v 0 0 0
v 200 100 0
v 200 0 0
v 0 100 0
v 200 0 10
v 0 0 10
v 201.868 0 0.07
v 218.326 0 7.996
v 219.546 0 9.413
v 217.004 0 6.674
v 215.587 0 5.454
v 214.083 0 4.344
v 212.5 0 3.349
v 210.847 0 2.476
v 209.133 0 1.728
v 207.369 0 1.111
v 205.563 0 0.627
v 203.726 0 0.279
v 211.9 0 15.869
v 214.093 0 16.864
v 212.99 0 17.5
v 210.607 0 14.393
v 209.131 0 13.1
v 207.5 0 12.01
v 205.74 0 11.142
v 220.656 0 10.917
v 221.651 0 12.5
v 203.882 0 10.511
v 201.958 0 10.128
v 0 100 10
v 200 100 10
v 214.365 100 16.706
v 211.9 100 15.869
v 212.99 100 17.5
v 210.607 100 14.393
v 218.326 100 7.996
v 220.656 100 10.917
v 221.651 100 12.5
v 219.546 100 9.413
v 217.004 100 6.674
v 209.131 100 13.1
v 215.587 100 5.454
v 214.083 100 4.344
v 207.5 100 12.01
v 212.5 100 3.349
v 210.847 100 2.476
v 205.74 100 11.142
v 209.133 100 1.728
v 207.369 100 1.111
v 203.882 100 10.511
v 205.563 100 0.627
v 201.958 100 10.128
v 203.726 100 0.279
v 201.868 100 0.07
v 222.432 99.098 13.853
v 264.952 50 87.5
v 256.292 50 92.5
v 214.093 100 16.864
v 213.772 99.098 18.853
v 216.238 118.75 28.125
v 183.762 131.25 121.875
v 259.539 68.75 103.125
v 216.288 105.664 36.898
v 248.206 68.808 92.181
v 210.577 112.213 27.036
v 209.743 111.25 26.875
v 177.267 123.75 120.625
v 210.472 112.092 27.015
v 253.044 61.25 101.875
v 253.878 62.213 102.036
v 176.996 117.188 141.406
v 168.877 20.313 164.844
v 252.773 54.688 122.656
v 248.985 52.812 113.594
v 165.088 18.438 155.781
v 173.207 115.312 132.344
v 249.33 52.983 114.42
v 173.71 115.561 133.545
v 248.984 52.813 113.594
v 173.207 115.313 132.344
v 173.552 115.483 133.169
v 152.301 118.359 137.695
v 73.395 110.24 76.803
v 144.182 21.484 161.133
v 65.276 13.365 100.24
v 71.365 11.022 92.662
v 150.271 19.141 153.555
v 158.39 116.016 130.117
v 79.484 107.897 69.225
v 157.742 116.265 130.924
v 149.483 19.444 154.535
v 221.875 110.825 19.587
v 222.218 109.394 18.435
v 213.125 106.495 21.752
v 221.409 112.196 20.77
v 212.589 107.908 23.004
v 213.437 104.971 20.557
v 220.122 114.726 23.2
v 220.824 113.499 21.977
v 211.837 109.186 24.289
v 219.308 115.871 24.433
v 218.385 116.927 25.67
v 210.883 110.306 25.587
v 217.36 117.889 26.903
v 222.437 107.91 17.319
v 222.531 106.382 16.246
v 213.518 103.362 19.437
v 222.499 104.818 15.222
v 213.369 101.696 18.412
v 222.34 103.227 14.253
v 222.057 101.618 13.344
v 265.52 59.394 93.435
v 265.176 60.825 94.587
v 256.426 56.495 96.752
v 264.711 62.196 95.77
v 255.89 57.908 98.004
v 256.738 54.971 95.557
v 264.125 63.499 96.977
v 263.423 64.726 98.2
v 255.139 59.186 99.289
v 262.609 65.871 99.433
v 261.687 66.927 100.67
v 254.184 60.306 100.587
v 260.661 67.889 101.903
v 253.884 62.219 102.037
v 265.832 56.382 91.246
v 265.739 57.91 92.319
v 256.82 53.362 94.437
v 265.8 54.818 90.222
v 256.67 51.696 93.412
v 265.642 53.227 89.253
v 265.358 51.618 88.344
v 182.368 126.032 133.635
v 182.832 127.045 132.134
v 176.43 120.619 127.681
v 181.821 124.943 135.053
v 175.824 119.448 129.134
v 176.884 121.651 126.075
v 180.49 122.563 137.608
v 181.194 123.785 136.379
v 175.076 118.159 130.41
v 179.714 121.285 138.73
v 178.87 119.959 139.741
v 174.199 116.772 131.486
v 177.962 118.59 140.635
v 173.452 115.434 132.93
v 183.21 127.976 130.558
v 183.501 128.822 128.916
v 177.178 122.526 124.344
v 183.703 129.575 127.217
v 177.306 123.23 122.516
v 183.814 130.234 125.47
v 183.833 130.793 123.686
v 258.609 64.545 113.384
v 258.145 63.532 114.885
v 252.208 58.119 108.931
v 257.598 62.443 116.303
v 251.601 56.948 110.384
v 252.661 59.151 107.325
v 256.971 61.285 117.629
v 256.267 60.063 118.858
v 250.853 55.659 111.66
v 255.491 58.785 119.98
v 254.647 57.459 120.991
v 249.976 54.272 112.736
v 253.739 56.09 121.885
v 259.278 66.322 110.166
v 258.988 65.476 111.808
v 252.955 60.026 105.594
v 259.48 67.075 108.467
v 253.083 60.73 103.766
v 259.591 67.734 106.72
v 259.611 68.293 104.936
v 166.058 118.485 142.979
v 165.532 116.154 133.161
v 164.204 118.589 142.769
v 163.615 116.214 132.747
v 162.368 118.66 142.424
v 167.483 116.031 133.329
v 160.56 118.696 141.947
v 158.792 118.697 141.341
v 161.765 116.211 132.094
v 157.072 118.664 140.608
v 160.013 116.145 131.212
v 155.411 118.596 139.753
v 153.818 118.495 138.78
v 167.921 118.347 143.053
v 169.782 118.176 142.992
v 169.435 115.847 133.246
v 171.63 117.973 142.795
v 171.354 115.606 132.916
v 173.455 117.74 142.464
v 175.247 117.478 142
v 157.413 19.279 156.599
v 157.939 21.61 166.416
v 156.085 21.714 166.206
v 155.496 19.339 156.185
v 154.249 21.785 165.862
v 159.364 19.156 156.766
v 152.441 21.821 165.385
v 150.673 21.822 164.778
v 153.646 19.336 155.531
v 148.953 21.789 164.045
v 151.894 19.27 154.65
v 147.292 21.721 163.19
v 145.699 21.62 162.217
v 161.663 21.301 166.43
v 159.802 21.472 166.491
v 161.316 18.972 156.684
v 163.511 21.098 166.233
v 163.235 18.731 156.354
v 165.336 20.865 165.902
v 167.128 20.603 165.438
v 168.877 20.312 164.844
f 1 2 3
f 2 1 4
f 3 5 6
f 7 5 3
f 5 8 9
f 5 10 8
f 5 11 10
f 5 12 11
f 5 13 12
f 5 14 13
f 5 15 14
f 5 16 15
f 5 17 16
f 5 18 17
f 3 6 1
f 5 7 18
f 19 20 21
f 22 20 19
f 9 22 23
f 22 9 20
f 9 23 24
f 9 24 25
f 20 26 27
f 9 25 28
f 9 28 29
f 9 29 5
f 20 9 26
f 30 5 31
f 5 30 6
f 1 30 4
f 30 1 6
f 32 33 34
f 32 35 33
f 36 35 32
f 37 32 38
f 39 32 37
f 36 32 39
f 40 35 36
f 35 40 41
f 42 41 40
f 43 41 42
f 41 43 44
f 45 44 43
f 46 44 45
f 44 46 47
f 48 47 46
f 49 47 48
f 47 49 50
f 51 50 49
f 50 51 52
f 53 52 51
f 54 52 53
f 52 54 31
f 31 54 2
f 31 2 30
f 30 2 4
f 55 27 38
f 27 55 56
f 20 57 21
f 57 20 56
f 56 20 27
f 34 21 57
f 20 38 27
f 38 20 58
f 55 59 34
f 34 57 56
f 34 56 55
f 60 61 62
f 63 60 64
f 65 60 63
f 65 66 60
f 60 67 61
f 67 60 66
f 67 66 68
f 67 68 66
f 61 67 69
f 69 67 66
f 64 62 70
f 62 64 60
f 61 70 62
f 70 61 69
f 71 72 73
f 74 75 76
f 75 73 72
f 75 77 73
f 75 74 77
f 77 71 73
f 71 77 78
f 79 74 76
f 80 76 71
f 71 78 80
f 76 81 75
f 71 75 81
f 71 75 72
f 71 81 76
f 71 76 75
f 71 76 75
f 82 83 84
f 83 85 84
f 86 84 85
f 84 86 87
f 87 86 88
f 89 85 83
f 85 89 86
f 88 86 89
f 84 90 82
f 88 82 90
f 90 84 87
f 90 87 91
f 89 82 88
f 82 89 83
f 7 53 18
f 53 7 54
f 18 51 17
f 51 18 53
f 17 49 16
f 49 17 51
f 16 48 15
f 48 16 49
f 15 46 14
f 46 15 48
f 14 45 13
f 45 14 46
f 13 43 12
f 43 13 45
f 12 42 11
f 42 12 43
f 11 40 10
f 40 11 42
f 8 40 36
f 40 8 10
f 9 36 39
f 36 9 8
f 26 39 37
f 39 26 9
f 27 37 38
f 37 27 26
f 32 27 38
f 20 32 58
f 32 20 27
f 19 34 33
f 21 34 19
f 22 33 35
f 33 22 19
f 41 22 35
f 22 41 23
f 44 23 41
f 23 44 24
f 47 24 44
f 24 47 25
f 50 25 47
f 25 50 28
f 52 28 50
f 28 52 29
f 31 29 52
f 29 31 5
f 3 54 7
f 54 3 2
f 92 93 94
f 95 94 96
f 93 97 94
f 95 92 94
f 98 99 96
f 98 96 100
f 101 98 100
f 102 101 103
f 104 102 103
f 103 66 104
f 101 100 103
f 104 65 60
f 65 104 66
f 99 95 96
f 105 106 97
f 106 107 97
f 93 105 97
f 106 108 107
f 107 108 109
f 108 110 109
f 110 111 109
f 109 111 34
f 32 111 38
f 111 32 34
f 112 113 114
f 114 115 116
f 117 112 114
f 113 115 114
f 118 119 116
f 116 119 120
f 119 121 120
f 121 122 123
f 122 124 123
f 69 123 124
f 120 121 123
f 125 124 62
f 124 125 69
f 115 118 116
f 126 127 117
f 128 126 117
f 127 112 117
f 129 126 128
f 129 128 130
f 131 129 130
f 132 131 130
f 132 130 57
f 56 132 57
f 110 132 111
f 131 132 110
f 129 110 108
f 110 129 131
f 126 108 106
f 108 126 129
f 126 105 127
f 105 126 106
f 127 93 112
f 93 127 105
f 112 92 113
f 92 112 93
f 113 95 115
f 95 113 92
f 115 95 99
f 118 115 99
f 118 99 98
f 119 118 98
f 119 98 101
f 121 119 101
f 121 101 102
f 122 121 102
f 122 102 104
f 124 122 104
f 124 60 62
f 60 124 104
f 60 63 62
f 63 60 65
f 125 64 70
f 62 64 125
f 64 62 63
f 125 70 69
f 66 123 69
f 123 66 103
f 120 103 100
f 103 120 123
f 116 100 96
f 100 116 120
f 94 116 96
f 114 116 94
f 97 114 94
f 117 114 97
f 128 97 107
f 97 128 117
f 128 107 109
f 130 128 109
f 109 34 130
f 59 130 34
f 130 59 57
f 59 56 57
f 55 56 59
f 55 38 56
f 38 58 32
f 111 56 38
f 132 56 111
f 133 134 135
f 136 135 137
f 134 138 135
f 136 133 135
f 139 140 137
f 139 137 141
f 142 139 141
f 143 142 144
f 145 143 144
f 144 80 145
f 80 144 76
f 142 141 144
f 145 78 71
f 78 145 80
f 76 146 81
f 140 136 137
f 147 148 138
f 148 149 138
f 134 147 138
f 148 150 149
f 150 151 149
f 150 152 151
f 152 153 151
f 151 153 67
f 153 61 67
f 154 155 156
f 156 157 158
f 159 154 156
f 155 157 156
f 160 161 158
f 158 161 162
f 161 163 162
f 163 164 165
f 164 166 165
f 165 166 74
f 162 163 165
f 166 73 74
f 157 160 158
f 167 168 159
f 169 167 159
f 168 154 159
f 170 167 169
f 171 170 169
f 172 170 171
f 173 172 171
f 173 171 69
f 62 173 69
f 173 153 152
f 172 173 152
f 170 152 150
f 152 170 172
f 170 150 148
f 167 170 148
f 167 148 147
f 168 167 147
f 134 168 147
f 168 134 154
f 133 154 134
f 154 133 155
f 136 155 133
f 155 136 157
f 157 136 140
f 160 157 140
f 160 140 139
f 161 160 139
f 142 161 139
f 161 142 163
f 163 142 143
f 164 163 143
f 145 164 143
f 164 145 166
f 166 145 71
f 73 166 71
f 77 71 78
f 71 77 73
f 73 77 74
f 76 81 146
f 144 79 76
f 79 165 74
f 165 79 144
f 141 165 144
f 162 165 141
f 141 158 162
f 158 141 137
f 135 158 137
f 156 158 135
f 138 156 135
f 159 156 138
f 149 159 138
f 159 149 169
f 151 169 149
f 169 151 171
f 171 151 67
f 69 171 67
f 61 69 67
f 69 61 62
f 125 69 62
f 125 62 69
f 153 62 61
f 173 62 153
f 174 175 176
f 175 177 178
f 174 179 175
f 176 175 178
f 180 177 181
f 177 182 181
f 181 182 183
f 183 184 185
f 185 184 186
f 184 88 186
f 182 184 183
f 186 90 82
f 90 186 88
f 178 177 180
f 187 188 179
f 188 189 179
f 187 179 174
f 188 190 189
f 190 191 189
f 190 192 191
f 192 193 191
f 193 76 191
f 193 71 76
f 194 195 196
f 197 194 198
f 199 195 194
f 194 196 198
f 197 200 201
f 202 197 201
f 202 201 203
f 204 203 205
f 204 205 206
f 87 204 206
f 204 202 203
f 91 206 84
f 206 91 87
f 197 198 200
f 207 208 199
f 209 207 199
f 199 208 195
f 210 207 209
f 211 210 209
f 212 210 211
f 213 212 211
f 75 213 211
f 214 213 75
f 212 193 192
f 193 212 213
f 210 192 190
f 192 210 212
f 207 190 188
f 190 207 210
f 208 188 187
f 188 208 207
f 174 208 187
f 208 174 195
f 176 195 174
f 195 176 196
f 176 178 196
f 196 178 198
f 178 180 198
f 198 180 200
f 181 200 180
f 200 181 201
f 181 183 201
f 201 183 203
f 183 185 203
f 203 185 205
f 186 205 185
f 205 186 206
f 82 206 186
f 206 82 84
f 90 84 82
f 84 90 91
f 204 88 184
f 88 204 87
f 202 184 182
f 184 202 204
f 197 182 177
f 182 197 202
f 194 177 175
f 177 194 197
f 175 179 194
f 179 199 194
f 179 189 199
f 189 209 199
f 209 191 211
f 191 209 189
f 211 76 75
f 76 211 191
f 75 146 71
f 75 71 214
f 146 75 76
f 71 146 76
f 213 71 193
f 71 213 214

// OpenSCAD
// Generated by Parametrix
ca_demoSheetFold2_SFG_pattern_000 = [ [ 0.0000, 0.0000 ],[ 200.0000, 0.0000 ],[ 220.9440, 0.0000 ],[ 307.5465, 50.0000 ],[ 318.0185, 68.1380 ],[ 338.9624, 68.1380 ],[ 425.5650, 118.1380 ],[ 436.0369, 136.2760 ],[ 486.0369, 222.8785 ],[ 399.4344, 272.8785 ],[ 349.4344, 186.2760 ],[ 338.9624, 168.1380 ],[ 318.0185, 168.1380 ],[ 231.4159, 118.1380 ],[ 220.9440, 100.0000 ],[ 200.0000, 100.0000 ],[ 0.0000, 100.0000 ],[ 0.0000, 0.0000 ] ];
cb_demoSheetFold2_SFG_pattern_000 = [  0, 1, 2, 3, 4, 5, 6, 7, 8, 9, 10, 11, 12, 13, 14, 15, 16, 17 ];
ca_demoSheetFold2_SFG_pattern_001 = [ [ 0.0000, 0.0000 ],[ 200.0000, 0.0000 ],[ 220.9440, 0.0000 ],[ 307.5465, 50.0000 ],[ 318.0185, 68.1380 ],[ 338.9624, 68.1380 ],[ 425.5650, 118.1380 ],[ 436.0369, 136.2760 ],[ 486.0369, 222.8785 ],[ 399.4344, 272.8785 ],[ 349.4344, 186.2760 ],[ 338.9624, 168.1380 ],[ 318.0185, 168.1380 ],[ 231.4159, 118.1380 ],[ 220.9440, 100.0000 ],[ 200.0000, 100.0000 ],[ 0.0000, 100.0000 ],[ 0.0000, 0.0000 ] ];
cb_demoSheetFold2_SFG_pattern_001 = [  18, 19, 20, 21, 22, 23, 24, 25, 26, 27, 28, 29, 30, 31, 32, 33, 34, 35 ];
ca_demoSheetFold2_SFG_pattern_002 = [ [ 219.9440, 49.0000 ],[ 220.1390, 49.0192 ],[ 220.3266, 49.0761 ],[ 220.4995, 49.1685 ],[ 220.6511, 49.2929 ],[ 220.7754, 49.4444 ],[ 220.8678, 49.6173 ],[ 220.9247, 49.8049 ],[ 220.9440, 50.0000 ],[ 220.9247, 50.1951 ],[ 220.8678, 50.3827 ],[ 220.7754, 50.5556 ],[ 220.6511, 50.7071 ],[ 220.4995, 50.8315 ],[ 220.3266, 50.9239 ],[ 220.1390, 50.9808 ],[ 219.9440, 51.0000 ],[ 201.0000, 51.0000 ],[ 200.8049, 50.9808 ],[ 200.6173, 50.9239 ],[ 200.4444, 50.8315 ],[ 200.2929, 50.7071 ],[ 200.1685, 50.5556 ],[ 200.0761, 50.3827 ],[ 200.0192, 50.1951 ],[ 200.0000, 50.0000 ],[ 200.0192, 49.8049 ],[ 200.0761, 49.6173 ],[ 200.1685, 49.4444 ],[ 200.2929, 49.2929 ],[ 200.4444, 49.1685 ],[ 200.6173, 49.0761 ],[ 200.8049, 49.0192 ],[ 201.0000, 49.0000 ],[ 219.9440, 49.0000 ] ];
cb_demoSheetFold2_SFG_pattern_002 = [  36, 37, 38, 39, 40, 41, 42, 43, 44, 45, 46, 47, 48, 49, 50, 51, 52, 53, 54, 55, 56, 57, 58, 59, 60, 61, 62, 63, 64, 65, 66, 67, 68, 69, 70 ];
ca_demoSheetFold2_SFG_pattern_003 = [ [ 263.8792, 76.3660 ],[ 263.7983, 76.1875 ],[ 263.7538, 75.9966 ],[ 263.7474, 75.8006 ],[ 263.7793, 75.6072 ],[ 263.8483, 75.4237 ],[ 263.9519, 75.2573 ],[ 264.0859, 75.1142 ],[ 264.2452, 75.0000 ],[ 264.4238, 74.9191 ],[ 264.6147, 74.8746 ],[ 264.8106, 74.8682 ],[ 265.0040, 74.9001 ],[ 265.1875, 74.9692 ],[ 265.3540, 75.0727 ],[ 265.4971, 75.2067 ],[ 265.6112, 75.3660 ],[ 275.0832, 91.7720 ],[ 275.1641, 91.9505 ],[ 275.2086, 92.1414 ],[ 275.2151, 92.3374 ],[ 275.1831, 92.5308 ],[ 275.1141, 92.7143 ],[ 275.0106, 92.8807 ],[ 274.8765, 93.0238 ],[ 274.7172, 93.1380 ],[ 274.5386, 93.2189 ],[ 274.3477, 93.2634 ],[ 274.1518, 93.2698 ],[ 273.9584, 93.2379 ],[ 273.7749, 93.1688 ],[ 273.6084, 93.0653 ],[ 273.4654, 92.9313 ],[ 273.3512, 92.7720 ],[ 263.8792, 76.3660 ] ];
cb_demoSheetFold2_SFG_pattern_003 = [  71, 72, 73, 74, 75, 76, 77, 78, 79, 80, 81, 82, 83, 84, 85, 86, 87, 88, 89, 90, 91, 92, 93, 94, 95, 96, 97, 98, 99, 100, 101, 102, 103, 104, 105 ];
ca_demoSheetFold2_SFG_pattern_004 = [ [ 337.9624, 117.1380 ],[ 338.1575, 117.1572 ],[ 338.3451, 117.2141 ],[ 338.5180, 117.3065 ],[ 338.6695, 117.4309 ],[ 338.7939, 117.5824 ],[ 338.8863, 117.7553 ],[ 338.9432, 117.9429 ],[ 338.9624, 118.1380 ],[ 338.9432, 118.3331 ],[ 338.8863, 118.5207 ],[ 338.7939, 118.6936 ],[ 338.6695, 118.8451 ],[ 338.5180, 118.9695 ],[ 338.3451, 119.0619 ],[ 338.1575, 119.1188 ],[ 337.9624, 119.1380 ],[ 319.0185, 119.1380 ],[ 318.8234, 119.1188 ],[ 318.6358, 119.0619 ],[ 318.4629, 118.9695 ],[ 318.3114, 118.8451 ],[ 318.1870, 118.6936 ],[ 318.0946, 118.5207 ],[ 318.0377, 118.3331 ],[ 318.0185, 118.1380 ],[ 318.0377, 117.9429 ],[ 318.0946, 117.7553 ],[ 318.1870, 117.5824 ],[ 318.3114, 117.4309 ],[ 318.4629, 117.3065 ],[ 318.6358, 117.2141 ],[ 318.8234, 117.1572 ],[ 319.0185, 117.1380 ],[ 337.9624, 117.1380 ] ];
cb_demoSheetFold2_SFG_pattern_004 = [  106, 107, 108, 109, 110, 111, 112, 113, 114, 115, 116, 117, 118, 119, 120, 121, 122, 123, 124, 125, 126, 127, 128, 129, 130, 131, 132, 133, 134, 135, 136, 137, 138, 139, 140 ];
ca_demoSheetFold2_SFG_pattern_005 = [ [ 393.1017, 159.9100 ],[ 393.1826, 160.0885 ],[ 393.2271, 160.2794 ],[ 393.2335, 160.4754 ],[ 393.2016, 160.6688 ],[ 393.1325, 160.8523 ],[ 393.0290, 161.0187 ],[ 392.8950, 161.1618 ],[ 392.7357, 161.2760 ],[ 392.5571, 161.3569 ],[ 392.3662, 161.4014 ],[ 392.1703, 161.4078 ],[ 391.9768, 161.3759 ],[ 391.7934, 161.3068 ],[ 391.6269, 161.2033 ],[ 391.4838, 161.0693 ],[ 391.3696, 160.9100 ],[ 381.8977, 144.5040 ],[ 381.8205, 144.3364 ],[ 381.7755, 144.1574 ],[ 381.7642, 143.9732 ],[ 381.7868, 143.7901 ],[ 381.8428, 143.6142 ],[ 381.9301, 143.4517 ],[ 382.0458, 143.3079 ],[ 382.1859, 143.1878 ],[ 382.3457, 143.0956 ],[ 382.5198, 143.0342 ],[ 382.7021, 143.0059 ],[ 382.8866, 143.0116 ],[ 383.0668, 143.0511 ],[ 383.2368, 143.1230 ],[ 383.3906, 143.2249 ],[ 383.5231, 143.3534 ],[ 383.6297, 143.5040 ],[ 393.1017, 159.9100 ] ];
cb_demoSheetFold2_SFG_pattern_005 = [  141, 142, 143, 144, 145, 146, 147, 148, 149, 150, 151, 152, 153, 154, 155, 156, 157, 158, 159, 160, 161, 162, 163, 164, 165, 166, 167, 168, 169, 170, 171, 172, 173, 174, 175, 176 ];
a_demoSheetFold2_SFG_pattern = concat(ca_demoSheetFold2_SFG_pattern_000, ca_demoSheetFold2_SFG_pattern_001, ca_demoSheetFold2_SFG_pattern_002, ca_demoSheetFold2_SFG_pattern_003, ca_demoSheetFold2_SFG_pattern_004, ca_demoSheetFold2_SFG_pattern_005);
b_demoSheetFold2_SFG_pattern = [cb_demoSheetFold2_SFG_pattern_000, cb_demoSheetFold2_SFG_pattern_001, cb_demoSheetFold2_SFG_pattern_002, cb_demoSheetFold2_SFG_pattern_003, cb_demoSheetFold2_SFG_pattern_004, cb_demoSheetFold2_SFG_pattern_005];
ca_demoSheetFold2_SFG_profiles_000 = [ [ 0.0000, 0.0000 ],[ 200.0000, 0.0000 ],[ 200.0000, 10.0000 ],[ 0.0000, 10.0000 ],[ 0.0000, 0.0000 ] ];
cb_demoSheetFold2_SFG_profiles_000 = [  0, 1, 2, 3, 4 ];
ca_demoSheetFold2_SFG_profiles_001 = [ [ 200.0000, 0.0000 ],[ 201.8683, 0.0699 ],[ 203.7261, 0.2792 ],[ 205.5630, 0.6268 ],[ 207.3689, 1.1107 ],[ 209.1335, 1.7282 ],[ 210.8471, 2.4758 ],[ 212.5000, 3.3494 ],[ 214.0830, 4.3440 ],[ 215.5872, 5.4542 ],[ 217.0043, 6.6737 ],[ 218.3263, 7.9957 ],[ 219.5458, 9.4128 ],[ 220.6560, 10.9170 ],[ 221.6506, 12.5000 ],[ 212.9904, 17.5000 ],[ 211.9003, 15.8686 ],[ 210.6066, 14.3934 ],[ 209.1314, 13.0997 ],[ 207.5000, 12.0096 ],[ 205.7403, 11.1418 ],[ 203.8823, 10.5111 ],[ 201.9579, 10.1283 ],[ 200.0000, 10.0000 ],[ 200.0000, 0.0000 ] ];
cb_demoSheetFold2_SFG_profiles_001 = [  5, 6, 7, 8, 9, 10, 11, 12, 13, 14, 15, 16, 17, 18, 19, 20, 21, 22, 23, 24, 25, 26, 27, 28, 29 ];
ca_demoSheetFold2_SFG_profiles_002 = [ [ 221.6506, 12.5000 ],[ 271.6506, 99.1025 ],[ 262.9904, 104.1025 ],[ 212.9904, 17.5000 ],[ 221.6506, 12.5000 ] ];
cb_demoSheetFold2_SFG_profiles_002 = [  30, 31, 32, 33, 34 ];
ca_demoSheetFold2_SFG_profiles_003 = [ [ 271.6506, 99.1025 ],[ 272.5242, 100.7554 ],[ 273.2718, 102.4690 ],[ 273.8893, 104.2337 ],[ 274.3732, 106.0395 ],[ 274.7208, 107.8765 ],[ 274.9301, 109.7343 ],[ 275.0000, 111.6025 ],[ 274.9301, 113.4708 ],[ 274.7208, 115.3286 ],[ 274.3732, 117.1656 ],[ 273.8893, 118.9714 ],[ 273.2718, 120.7361 ],[ 272.5242, 122.4496 ],[ 271.6506, 124.1025 ],[ 262.9904, 119.1025 ],[ 263.8582, 117.3428 ],[ 264.4889, 115.4848 ],[ 264.8717, 113.5604 ],[ 265.0000, 111.6025 ],[ 264.8717, 109.6446 ],[ 264.4889, 107.7203 ],[ 263.8582, 105.8623 ],[ 262.9904, 104.1025 ],[ 271.6506, 99.1025 ] ];
cb_demoSheetFold2_SFG_profiles_003 = [  35, 36, 37, 38, 39, 40, 41, 42, 43, 44, 45, 46, 47, 48, 49, 50, 51, 52, 53, 54, 55, 56, 57, 58, 59 ];
ca_demoSheetFold2_SFG_profiles_004 = [ [ 271.6506, 124.1025 ],[ 271.1506, 124.9686 ],[ 262.4904, 119.9686 ],[ 262.9904, 119.1025 ],[ 271.6506, 124.1025 ] ];
cb_demoSheetFold2_SFG_profiles_004 = [  60, 61, 62, 63, 64 ];
ca_demoSheetFold2_SFG_profiles_005 = [ [ 271.1506, 124.9686 ],[ 270.1560, 126.5516 ],[ 269.0458, 128.0558 ],[ 267.8263, 129.4729 ],[ 266.5043, 130.7949 ],[ 265.0872, 132.0144 ],[ 263.5830, 133.1245 ],[ 262.0000, 134.1192 ],[ 260.3471, 134.9928 ],[ 258.6335, 135.7404 ],[ 256.8689, 136.3579 ],[ 255.0630, 136.8418 ],[ 253.2261, 137.1893 ],[ 251.3683, 137.3987 ],[ 249.5000, 137.4686 ],[ 249.5000, 127.4686 ],[ 251.4579, 127.3402 ],[ 253.3823, 126.9575 ],[ 255.2403, 126.3268 ],[ 257.0000, 125.4589 ],[ 258.6314, 124.3689 ],[ 260.1066, 123.0752 ],[ 261.4003, 121.6000 ],[ 262.4904, 119.9686 ],[ 271.1506, 124.9686 ] ];
cb_demoSheetFold2_SFG_profiles_005 = [  65, 66, 67, 68, 69, 70, 71, 72, 73, 74, 75, 76, 77, 78, 79, 80, 81, 82, 83, 84, 85, 86, 87, 88, 89 ];
ca_demoSheetFold2_SFG_profiles_006 = [ [ 249.5000, 137.4686 ],[ 149.5000, 137.4686 ],[ 149.5000, 127.4686 ],[ 249.5000, 127.4686 ],[ 249.5000, 137.4686 ] ];
cb_demoSheetFold2_SFG_profiles_006 = [  90, 91, 92, 93, 94 ];
ca_demoSheetFold2_SFG_profiles_007 = [ [ 149.5000, 137.4686 ],[ 147.6317, 137.3987 ],[ 145.7739, 137.1893 ],[ 143.9370, 136.8418 ],[ 142.1311, 136.3579 ],[ 140.3665, 135.7404 ],[ 138.6529, 134.9928 ],[ 137.0000, 134.1192 ],[ 135.4170, 133.1245 ],[ 133.9128, 132.0144 ],[ 132.4957, 130.7949 ],[ 131.1737, 129.4729 ],[ 129.9542, 128.0558 ],[ 128.8440, 126.5516 ],[ 127.8494, 124.9686 ],[ 136.5096, 119.9686 ],[ 137.5997, 121.6000 ],[ 138.8934, 123.0752 ],[ 140.3686, 124.3689 ],[ 142.0000, 125.4589 ],[ 143.7597, 126.3268 ],[ 145.6177, 126.9575 ],[ 147.5421, 127.3402 ],[ 149.5000, 127.4686 ],[ 149.5000, 137.4686 ] ];
cb_demoSheetFold2_SFG_profiles_007 = [  95, 96, 97, 98, 99, 100, 101, 102, 103, 104, 105, 106, 107, 108, 109, 110, 111, 112, 113, 114, 115, 116, 117, 118, 119 ];
ca_demoSheetFold2_SFG_profiles_008 = [ [ 127.8494, 124.9686 ],[ 77.8494, 38.3660 ],[ 86.5096, 33.3660 ],[ 136.5096, 119.9686 ],[ 127.8494, 124.9686 ] ];
cb_demoSheetFold2_SFG_profiles_008 = [  120, 121, 122, 123, 124 ];
ca_demoSheetFold2_SFG_profiles_009 = [ [ 0.0000, 400.0000 ],[ 200.0000, 400.0000 ],[ 200.0000, 410.0000 ],[ 0.0000, 410.0000 ],[ 0.0000, 400.0000 ] ];
cb_demoSheetFold2_SFG_profiles_009 = [  125, 126, 127, 128, 129 ];
ca_demoSheetFold2_SFG_profiles_010 = [ [ 200.0000, 400.0000 ],[ 201.8683, 400.0699 ],[ 203.7261, 400.2792 ],[ 205.5630, 400.6268 ],[ 207.3689, 401.1107 ],[ 209.1335, 401.7282 ],[ 210.8471, 402.4758 ],[ 212.5000, 403.3494 ],[ 214.0830, 404.3440 ],[ 215.5872, 405.4542 ],[ 217.0043, 406.6737 ],[ 218.3263, 407.9957 ],[ 219.5458, 409.4128 ],[ 220.6560, 410.9170 ],[ 221.6506, 412.5000 ],[ 212.9904, 417.5000 ],[ 211.9003, 415.8686 ],[ 210.6066, 414.3934 ],[ 209.1314, 413.0997 ],[ 207.5000, 412.0096 ],[ 205.7403, 411.1418 ],[ 203.8823, 410.5111 ],[ 201.9579, 410.1283 ],[ 200.0000, 410.0000 ],[ 200.0000, 400.0000 ] ];
cb_demoSheetFold2_SFG_profiles_010 = [  130, 131, 132, 133, 134, 135, 136, 137, 138, 139, 140, 141, 142, 143, 144, 145, 146, 147, 148, 149, 150, 151, 152, 153, 154 ];
ca_demoSheetFold2_SFG_profiles_011 = [ [ 221.6506, 412.5000 ],[ 222.1506, 413.3660 ],[ 213.4904, 418.3660 ],[ 212.9904, 417.5000 ],[ 221.6506, 412.5000 ] ];
cb_demoSheetFold2_SFG_profiles_011 = [  155, 156, 157, 158, 159 ];
ca_demoSheetFold2_SFG_profiles_012 = [ [ 222.1506, 413.3660 ],[ 223.0242, 415.0189 ],[ 223.7718, 416.7325 ],[ 224.3893, 418.4971 ],[ 224.8732, 420.3030 ],[ 225.2208, 422.1400 ],[ 225.4301, 423.9978 ],[ 225.5000, 425.8660 ],[ 225.4301, 427.7343 ],[ 225.2208, 429.5921 ],[ 224.8732, 431.4290 ],[ 224.3893, 433.2349 ],[ 223.7718, 434.9996 ],[ 223.0242, 436.7131 ],[ 222.1506, 438.3660 ],[ 213.4904, 433.3660 ],[ 214.3582, 431.6063 ],[ 214.9889, 429.7483 ],[ 215.3717, 427.8239 ],[ 215.5000, 425.8660 ],[ 215.3717, 423.9081 ],[ 214.9889, 421.9837 ],[ 214.3582, 420.1258 ],[ 213.4904, 418.3660 ],[ 222.1506, 413.3660 ] ];
cb_demoSheetFold2_SFG_profiles_012 = [  160, 161, 162, 163, 164, 165, 166, 167, 168, 169, 170, 171, 172, 173, 174, 175, 176, 177, 178, 179, 180, 181, 182, 183, 184 ];
ca_demoSheetFold2_SFG_profiles_013 = [ [ 222.1506, 438.3660 ],[ 172.1506, 524.9686 ],[ 163.4904, 519.9686 ],[ 213.4904, 433.3660 ],[ 222.1506, 438.3660 ] ];
cb_demoSheetFold2_SFG_profiles_013 = [  185, 186, 187, 188, 189 ];
ca_demoSheetFold2_SFG_profiles_014 = [ [ 172.1506, 524.9686 ],[ 171.1560, 526.5516 ],[ 170.0458, 528.0558 ],[ 168.8263, 529.4729 ],[ 167.5043, 530.7949 ],[ 166.0872, 532.0144 ],[ 164.5830, 533.1245 ],[ 163.0000, 534.1192 ],[ 161.3471, 534.9928 ],[ 159.6335, 535.7404 ],[ 157.8689, 536.3579 ],[ 156.0630, 536.8418 ],[ 154.2261, 537.1893 ],[ 152.3683, 537.3987 ],[ 150.5000, 537.4686 ],[ 150.5000, 527.4686 ],[ 152.4579, 527.3402 ],[ 154.3823, 526.9575 ],[ 156.2403, 526.3268 ],[ 158.0000, 525.4589 ],[ 159.6314, 524.3689 ],[ 161.1066, 523.0752 ],[ 162.4003, 521.6000 ],[ 163.4904, 519.9686 ],[ 172.1506, 524.9686 ] ];
cb_demoSheetFold2_SFG_profiles_014 = [  190, 191, 192, 193, 194, 195, 196, 197, 198, 199, 200, 201, 202, 203, 204, 205, 206, 207, 208, 209, 210, 211, 212, 213, 214 ];
ca_demoSheetFold2_SFG_profiles_015 = [ [ 150.5000, 537.4686 ],[ 149.5000, 537.4686 ],[ 149.5000, 527.4686 ],[ 150.5000, 527.4686 ],[ 150.5000, 537.4686 ] ];
cb_demoSheetFold2_SFG_profiles_015 = [  215, 216, 217, 218, 219 ];
ca_demoSheetFold2_SFG_profiles_016 = [ [ 149.5000, 537.4686 ],[ 147.6317, 537.3987 ],[ 145.7739, 537.1893 ],[ 143.9370, 536.8418 ],[ 142.1311, 536.3579 ],[ 140.3665, 535.7404 ],[ 138.6529, 534.9928 ],[ 137.0000, 534.1192 ],[ 135.4170, 533.1245 ],[ 133.9128, 532.0144 ],[ 132.4957, 530.7949 ],[ 131.1737, 529.4729 ],[ 129.9542, 528.0558 ],[ 128.8440, 526.5516 ],[ 127.8494, 524.9686 ],[ 136.5096, 519.9686 ],[ 137.5997, 521.6000 ],[ 138.8934, 523.0752 ],[ 140.3686, 524.3689 ],[ 142.0000, 525.4589 ],[ 143.7597, 526.3268 ],[ 145.6177, 526.9575 ],[ 147.5421, 527.3402 ],[ 149.5000, 527.4686 ],[ 149.5000, 537.4686 ] ];
cb_demoSheetFold2_SFG_profiles_016 = [  220, 221, 222, 223, 224, 225, 226, 227, 228, 229, 230, 231, 232, 233, 234, 235, 236, 237, 238, 239, 240, 241, 242, 243, 244 ];
ca_demoSheetFold2_SFG_profiles_017 = [ [ 127.8494, 524.9686 ],[ 77.8494, 438.3660 ],[ 86.5096, 433.3660 ],[ 136.5096, 519.9686 ],[ 127.8494, 524.9686 ] ];
cb_demoSheetFold2_SFG_profiles_017 = [  245, 246, 247, 248, 249 ];
a_demoSheetFold2_SFG_profiles = concat(ca_demoSheetFold2_SFG_profiles_000, ca_demoSheetFold2_SFG_profiles_001, ca_demoSheetFold2_SFG_profiles_002, ca_demoSheetFold2_SFG_profiles_003, ca_demoSheetFold2_SFG_profiles_004, ca_demoSheetFold2_SFG_profiles_005, ca_demoSheetFold2_SFG_profiles_006, ca_demoSheetFold2_SFG_profiles_007, ca_demoSheetFold2_SFG_profiles_008, ca_demoSheetFold2_SFG_profiles_009, ca_demoSheetFold2_SFG_profiles_010, ca_demoSheetFold2_SFG_profiles_011, ca_demoSheetFold2_SFG_profiles_012, ca_demoSheetFold2_SFG_profiles_013, ca_demoSheetFold2_SFG_profiles_014, ca_demoSheetFold2_SFG_profiles_015, ca_demoSheetFold2_SFG_profiles_016, ca_demoSheetFold2_SFG_profiles_017);
b_demoSheetFold2_SFG_profiles = [cb_demoSheetFold2_SFG_profiles_000, cb_demoSheetFold2_SFG_profiles_001, cb_demoSheetFold2_SFG_profiles_002, cb_demoSheetFold2_SFG_profiles_003, cb_demoSheetFold2_SFG_profiles_004, cb_demoSheetFold2_SFG_profiles_005, cb_demoSheetFold2_SFG_profiles_006, cb_demoSheetFold2_SFG_profiles_007, cb_demoSheetFold2_SFG_profiles_008, cb_demoSheetFold2_SFG_profiles_009, cb_demoSheetFold2_SFG_profiles_010, cb_demoSheetFold2_SFG_profiles_011, cb_demoSheetFold2_SFG_profiles_012, cb_demoSheetFold2_SFG_profiles_013, cb_demoSheetFold2_SFG_profiles_014, cb_demoSheetFold2_SFG_profiles_015, cb_demoSheetFold2_SFG_profiles_016, cb_demoSheetFold2_SFG_profiles_017];
ca_demoSheetFold2_SFG_f00_000 = [ [ 0.0000, 0.0000 ],[ 200.0000, 0.0000 ],[ 200.0000, 100.0000 ],[ 0.0000, 100.0000 ],[ 0.0000, 0.0000 ] ];
cb_demoSheetFold2_SFG_f00_000 = [  0, 1, 2, 3, 4 ];
a_demoSheetFold2_SFG_f00 = concat(ca_demoSheetFold2_SFG_f00_000);
b_demoSheetFold2_SFG_f00 = [cb_demoSheetFold2_SFG_f00_000];
ca_demoSheetFold2_SFG_f01_000 = [ [ 0.0000, 100.0000 ],[ 0.0000, 0.0000 ],[ 86.6025, 50.0000 ],[ 0.0000, 100.0000 ] ];
cb_demoSheetFold2_SFG_f01_000 = [  0, 1, 2, 3 ];
a_demoSheetFold2_SFG_f01 = concat(ca_demoSheetFold2_SFG_f01_000);
b_demoSheetFold2_SFG_f01 = [cb_demoSheetFold2_SFG_f01_000];
ca_demoSheetFold2_SFG_f02_000 = [ [ 0.0000, 100.0000 ],[ -86.6025, 50.0000 ],[ 0.0000, 0.0000 ],[ 0.0000, 100.0000 ] ];
cb_demoSheetFold2_SFG_f02_000 = [  0, 1, 2, 3 ];
a_demoSheetFold2_SFG_f02 = concat(ca_demoSheetFold2_SFG_f02_000);
b_demoSheetFold2_SFG_f02 = [cb_demoSheetFold2_SFG_f02_000];
ca_demoSheetFold2_SFG_f03_000 = [ [ 0.0000, 100.0000 ],[ 0.0000, 0.0000 ],[ 86.6025, 50.0000 ],[ 0.0000, 100.0000 ] ];
cb_demoSheetFold2_SFG_f03_000 = [  0, 1, 2, 3 ];
a_demoSheetFold2_SFG_f03 = concat(ca_demoSheetFold2_SFG_f03_000);
b_demoSheetFold2_SFG_f03 = [cb_demoSheetFold2_SFG_f03_000];
ca_demoSheetFold2_SFG_f04_000 = [ [ -0.0000, 0.0000 ],[ 100.0000, 0.0000 ],[ 100.0000, 100.0000 ],[ -0.0000, 100.0000 ],[ -0.0000, 0.0000 ] ];
cb_demoSheetFold2_SFG_f04_000 = [  0, 1, 2, 3, 4 ];
a_demoSheetFold2_SFG_f04 = concat(ca_demoSheetFold2_SFG_f04_000);
b_demoSheetFold2_SFG_f04 = [cb_demoSheetFold2_SFG_f04_000];
ca_demoSheetFold2_SFG_fj00_000 = [ [ 0.0000, 0.0000 ],[ 1.8683, 0.0699 ],[ 3.7261, 0.2792 ],[ 5.5630, 0.6268 ],[ 7.3689, 1.1107 ],[ 9.1335, 1.7282 ],[ 10.8471, 2.4758 ],[ 12.5000, 3.3494 ],[ 14.0830, 4.3440 ],[ 15.5872, 5.4542 ],[ 17.0043, 6.6737 ],[ 18.3263, 7.9957 ],[ 19.5458, 9.4128 ],[ 20.6560, 10.9170 ],[ 21.6506, 12.5000 ],[ 12.9904, 17.5000 ],[ 11.9003, 15.8686 ],[ 10.6066, 14.3934 ],[ 9.1314, 13.0997 ],[ 7.5000, 12.0096 ],[ 5.7403, 11.1418 ],[ 3.8823, 10.5111 ],[ 1.9579, 10.1283 ],[ -0.0000, 10.0000 ],[ 0.0000, 0.0000 ] ];
cb_demoSheetFold2_SFG_fj00_000 = [  0, 1, 2, 3, 4, 5, 6, 7, 8, 9, 10, 11, 12, 13, 14, 15, 16, 17, 18, 19, 20, 21, 22, 23, 24 ];
a_demoSheetFold2_SFG_fj00 = concat(ca_demoSheetFold2_SFG_fj00_000);
b_demoSheetFold2_SFG_fj00 = [cb_demoSheetFold2_SFG_fj00_000];
ca_demoSheetFold2_SFG_fj01_000 = [ [ 0.0000, 0.0000 ],[ 1.8683, 0.0699 ],[ 3.7261, 0.2792 ],[ 5.5630, 0.6268 ],[ 7.3689, 1.1107 ],[ 9.1335, 1.7282 ],[ 10.8471, 2.4758 ],[ 12.5000, 3.3494 ],[ 14.0830, 4.3440 ],[ 15.5872, 5.4542 ],[ 17.0043, 6.6737 ],[ 18.3263, 7.9957 ],[ 19.5458, 9.4128 ],[ 20.6560, 10.9170 ],[ 21.6506, 12.5000 ],[ 12.9904, 17.5000 ],[ 11.9003, 15.8686 ],[ 10.6066, 14.3934 ],[ 9.1314, 13.0997 ],[ 7.5000, 12.0096 ],[ 5.7403, 11.1418 ],[ 3.8823, 10.5111 ],[ 1.9579, 10.1283 ],[ -0.0000, 10.0000 ],[ 0.0000, 0.0000 ] ];
cb_demoSheetFold2_SFG_fj01_000 = [  0, 1, 2, 3, 4, 5, 6, 7, 8, 9, 10, 11, 12, 13, 14, 15, 16, 17, 18, 19, 20, 21, 22, 23, 24 ];
a_demoSheetFold2_SFG_fj01 = concat(ca_demoSheetFold2_SFG_fj01_000);
b_demoSheetFold2_SFG_fj01 = [cb_demoSheetFold2_SFG_fj01_000];
ca_demoSheetFold2_SFG_fj02_000 = [ [ 0.0000, 0.0000 ],[ 1.8683, 0.0699 ],[ 3.7261, 0.2792 ],[ 5.5630, 0.6268 ],[ 7.3689, 1.1107 ],[ 9.1335, 1.7282 ],[ 10.8471, 2.4758 ],[ 12.5000, 3.3494 ],[ 14.0830, 4.3440 ],[ 15.5872, 5.4542 ],[ 17.0043, 6.6737 ],[ 18.3263, 7.9957 ],[ 19.5458, 9.4128 ],[ 20.6560, 10.9170 ],[ 21.6506, 12.5000 ],[ 12.9904, 17.5000 ],[ 11.9003, 15.8686 ],[ 10.6066, 14.3934 ],[ 9.1314, 13.0997 ],[ 7.5000, 12.0096 ],[ 5.7403, 11.1418 ],[ 3.8823, 10.5111 ],[ 1.9579, 10.1283 ],[ -0.0000, 10.0000 ],[ 0.0000, 0.0000 ] ];
cb_demoSheetFold2_SFG_fj02_000 = [  0, 1, 2, 3, 4, 5, 6, 7, 8, 9, 10, 11, 12, 13, 14, 15, 16, 17, 18, 19, 20, 21, 22, 23, 24 ];
a_demoSheetFold2_SFG_fj02 = concat(ca_demoSheetFold2_SFG_fj02_000);
b_demoSheetFold2_SFG_fj02 = [cb_demoSheetFold2_SFG_fj02_000];
ca_demoSheetFold2_SFG_fj03_000 = [ [ 0.0000, 0.0000 ],[ 1.8683, 0.0699 ],[ 3.7261, 0.2792 ],[ 5.5630, 0.6268 ],[ 7.3689, 1.1107 ],[ 9.1335, 1.7282 ],[ 10.8471, 2.4758 ],[ 12.5000, 3.3494 ],[ 14.0830, 4.3440 ],[ 15.5872, 5.4542 ],[ 17.0043, 6.6737 ],[ 18.3263, 7.9957 ],[ 19.5458, 9.4128 ],[ 20.6560, 10.9170 ],[ 21.6506, 12.5000 ],[ 12.9904, 17.5000 ],[ 11.9003, 15.8686 ],[ 10.6066, 14.3934 ],[ 9.1314, 13.0997 ],[ 7.5000, 12.0096 ],[ 5.7403, 11.1418 ],[ 3.8823, 10.5111 ],[ 1.9579, 10.1283 ],[ -0.0000, 10.0000 ],[ 0.0000, 0.0000 ] ];
cb_demoSheetFold2_SFG_fj03_000 = [  0, 1, 2, 3, 4, 5, 6, 7, 8, 9, 10, 11, 12, 13, 14, 15, 16, 17, 18, 19, 20, 21, 22, 23, 24 ];
a_demoSheetFold2_SFG_fj03 = concat(ca_demoSheetFold2_SFG_fj03_000);
b_demoSheetFold2_SFG_fj03 = [cb_demoSheetFold2_SFG_fj03_000];

module subpax_demoSheetFold2_SFG_f00 () {
	translate( [ 0, 0, 0 ])
		rotate( [ 0, 0, 0 ])
			   linear_extrude(height = 10) polygon(a_demoSheetFold2_SFG_f00, b_demoSheetFold2_SFG_f00);
}

module subpax_demoSheetFold2_SFG_f01 () {
	translate( [ 221.65063509461098, -1.3257190484061335e-15, 12.5 ])
		rotate( [ -6.07664850350169e-15, -59.99999999999999, 3.5083546492674368e-15 ])
			   linear_extrude(height = 10) polygon(a_demoSheetFold2_SFG_f01, b_demoSheetFold2_SFG_f01);
}

module subpax_demoSheetFold2_SFG_f02 () {
	translate( [ 216.2379763209582, 118.75000000000001, 28.124999999999986 ])
		rotate( [ 99.46232220802563, 40.505350327418604, -34.71500395394824 ])
			   linear_extrude(height = 10) polygon(a_demoSheetFold2_SFG_f02, b_demoSheetFold2_SFG_f02);
}

module subpax_demoSheetFold2_SFG_f03 () {
	translate( [ 252.77342304311424, 54.68749999999998, 122.65625 ])
		rotate( [ 168.31063082456083, -22.26470306150356, -125.03307504922282 ])
			   linear_extrude(height = 10) polygon(a_demoSheetFold2_SFG_f03, b_demoSheetFold2_SFG_f03);
}

module subpax_demoSheetFold2_SFG_f04 () {
	translate( [ 144.18195639670608, 21.484375000000046, 161.1328125 ])
		rotate( [ -162.81429385577522, 37.51174985202767, -174.12527598771288 ])
			   linear_extrude(height = 10) polygon(a_demoSheetFold2_SFG_f04, b_demoSheetFold2_SFG_f04);
}

module subpax_demoSheetFold2_SFG_fj00 () {
	translate( [ 200, 100, 0 ])
		rotate( [ 90, 0, 0 ])
			   linear_extrude(height = 100) polygon(a_demoSheetFold2_SFG_fj00, b_demoSheetFold2_SFG_fj00);
}

module subpax_demoSheetFold2_SFG_fj01 () {
	translate( [ 221.65063509461095, 100.00000000000001, 12.499999999999979 ])
		rotate( [ 33.6900675259798, -25.658906273255287, 73.89788624801398 ])
			   linear_extrude(height = 100.00000000000001) polygon(a_demoSheetFold2_SFG_fj01, b_demoSheetFold2_SFG_fj01);
}

module subpax_demoSheetFold2_SFG_fj02 () {
	translate( [ 183.7620236790418, 131.25, 121.87499999999997 ])
		rotate( [ -146.30993247402023, -76.97671881976584, -73.89788624801399 ])
			   linear_extrude(height = 100) polygon(a_demoSheetFold2_SFG_fj02, b_demoSheetFold2_SFG_fj02);
}

module subpax_demoSheetFold2_SFG_fj03 () {
	translate( [ 176.99620021197586, 117.18750000000007, 141.40625 ])
		rotate( [ -75.49983323344743, -20.59884754384003, 170.01034825535294 ])
			   linear_extrude(height = 100.00000000000001) polygon(a_demoSheetFold2_SFG_fj03, b_demoSheetFold2_SFG_fj03);
}

module pax_demoSheetFold2 () {
	union () {
		subpax_demoSheetFold2_SFG_f00();
subpax_demoSheetFold2_SFG_f01();
subpax_demoSheetFold2_SFG_f02();
subpax_demoSheetFold2_SFG_f03();
subpax_demoSheetFold2_SFG_f04();
subpax_demoSheetFold2_SFG_fj00();
subpax_demoSheetFold2_SFG_fj01();
subpax_demoSheetFold2_SFG_fj02();
subpax_demoSheetFold2_SFG_fj03();
	}
}

pax_demoSheetFold2();
